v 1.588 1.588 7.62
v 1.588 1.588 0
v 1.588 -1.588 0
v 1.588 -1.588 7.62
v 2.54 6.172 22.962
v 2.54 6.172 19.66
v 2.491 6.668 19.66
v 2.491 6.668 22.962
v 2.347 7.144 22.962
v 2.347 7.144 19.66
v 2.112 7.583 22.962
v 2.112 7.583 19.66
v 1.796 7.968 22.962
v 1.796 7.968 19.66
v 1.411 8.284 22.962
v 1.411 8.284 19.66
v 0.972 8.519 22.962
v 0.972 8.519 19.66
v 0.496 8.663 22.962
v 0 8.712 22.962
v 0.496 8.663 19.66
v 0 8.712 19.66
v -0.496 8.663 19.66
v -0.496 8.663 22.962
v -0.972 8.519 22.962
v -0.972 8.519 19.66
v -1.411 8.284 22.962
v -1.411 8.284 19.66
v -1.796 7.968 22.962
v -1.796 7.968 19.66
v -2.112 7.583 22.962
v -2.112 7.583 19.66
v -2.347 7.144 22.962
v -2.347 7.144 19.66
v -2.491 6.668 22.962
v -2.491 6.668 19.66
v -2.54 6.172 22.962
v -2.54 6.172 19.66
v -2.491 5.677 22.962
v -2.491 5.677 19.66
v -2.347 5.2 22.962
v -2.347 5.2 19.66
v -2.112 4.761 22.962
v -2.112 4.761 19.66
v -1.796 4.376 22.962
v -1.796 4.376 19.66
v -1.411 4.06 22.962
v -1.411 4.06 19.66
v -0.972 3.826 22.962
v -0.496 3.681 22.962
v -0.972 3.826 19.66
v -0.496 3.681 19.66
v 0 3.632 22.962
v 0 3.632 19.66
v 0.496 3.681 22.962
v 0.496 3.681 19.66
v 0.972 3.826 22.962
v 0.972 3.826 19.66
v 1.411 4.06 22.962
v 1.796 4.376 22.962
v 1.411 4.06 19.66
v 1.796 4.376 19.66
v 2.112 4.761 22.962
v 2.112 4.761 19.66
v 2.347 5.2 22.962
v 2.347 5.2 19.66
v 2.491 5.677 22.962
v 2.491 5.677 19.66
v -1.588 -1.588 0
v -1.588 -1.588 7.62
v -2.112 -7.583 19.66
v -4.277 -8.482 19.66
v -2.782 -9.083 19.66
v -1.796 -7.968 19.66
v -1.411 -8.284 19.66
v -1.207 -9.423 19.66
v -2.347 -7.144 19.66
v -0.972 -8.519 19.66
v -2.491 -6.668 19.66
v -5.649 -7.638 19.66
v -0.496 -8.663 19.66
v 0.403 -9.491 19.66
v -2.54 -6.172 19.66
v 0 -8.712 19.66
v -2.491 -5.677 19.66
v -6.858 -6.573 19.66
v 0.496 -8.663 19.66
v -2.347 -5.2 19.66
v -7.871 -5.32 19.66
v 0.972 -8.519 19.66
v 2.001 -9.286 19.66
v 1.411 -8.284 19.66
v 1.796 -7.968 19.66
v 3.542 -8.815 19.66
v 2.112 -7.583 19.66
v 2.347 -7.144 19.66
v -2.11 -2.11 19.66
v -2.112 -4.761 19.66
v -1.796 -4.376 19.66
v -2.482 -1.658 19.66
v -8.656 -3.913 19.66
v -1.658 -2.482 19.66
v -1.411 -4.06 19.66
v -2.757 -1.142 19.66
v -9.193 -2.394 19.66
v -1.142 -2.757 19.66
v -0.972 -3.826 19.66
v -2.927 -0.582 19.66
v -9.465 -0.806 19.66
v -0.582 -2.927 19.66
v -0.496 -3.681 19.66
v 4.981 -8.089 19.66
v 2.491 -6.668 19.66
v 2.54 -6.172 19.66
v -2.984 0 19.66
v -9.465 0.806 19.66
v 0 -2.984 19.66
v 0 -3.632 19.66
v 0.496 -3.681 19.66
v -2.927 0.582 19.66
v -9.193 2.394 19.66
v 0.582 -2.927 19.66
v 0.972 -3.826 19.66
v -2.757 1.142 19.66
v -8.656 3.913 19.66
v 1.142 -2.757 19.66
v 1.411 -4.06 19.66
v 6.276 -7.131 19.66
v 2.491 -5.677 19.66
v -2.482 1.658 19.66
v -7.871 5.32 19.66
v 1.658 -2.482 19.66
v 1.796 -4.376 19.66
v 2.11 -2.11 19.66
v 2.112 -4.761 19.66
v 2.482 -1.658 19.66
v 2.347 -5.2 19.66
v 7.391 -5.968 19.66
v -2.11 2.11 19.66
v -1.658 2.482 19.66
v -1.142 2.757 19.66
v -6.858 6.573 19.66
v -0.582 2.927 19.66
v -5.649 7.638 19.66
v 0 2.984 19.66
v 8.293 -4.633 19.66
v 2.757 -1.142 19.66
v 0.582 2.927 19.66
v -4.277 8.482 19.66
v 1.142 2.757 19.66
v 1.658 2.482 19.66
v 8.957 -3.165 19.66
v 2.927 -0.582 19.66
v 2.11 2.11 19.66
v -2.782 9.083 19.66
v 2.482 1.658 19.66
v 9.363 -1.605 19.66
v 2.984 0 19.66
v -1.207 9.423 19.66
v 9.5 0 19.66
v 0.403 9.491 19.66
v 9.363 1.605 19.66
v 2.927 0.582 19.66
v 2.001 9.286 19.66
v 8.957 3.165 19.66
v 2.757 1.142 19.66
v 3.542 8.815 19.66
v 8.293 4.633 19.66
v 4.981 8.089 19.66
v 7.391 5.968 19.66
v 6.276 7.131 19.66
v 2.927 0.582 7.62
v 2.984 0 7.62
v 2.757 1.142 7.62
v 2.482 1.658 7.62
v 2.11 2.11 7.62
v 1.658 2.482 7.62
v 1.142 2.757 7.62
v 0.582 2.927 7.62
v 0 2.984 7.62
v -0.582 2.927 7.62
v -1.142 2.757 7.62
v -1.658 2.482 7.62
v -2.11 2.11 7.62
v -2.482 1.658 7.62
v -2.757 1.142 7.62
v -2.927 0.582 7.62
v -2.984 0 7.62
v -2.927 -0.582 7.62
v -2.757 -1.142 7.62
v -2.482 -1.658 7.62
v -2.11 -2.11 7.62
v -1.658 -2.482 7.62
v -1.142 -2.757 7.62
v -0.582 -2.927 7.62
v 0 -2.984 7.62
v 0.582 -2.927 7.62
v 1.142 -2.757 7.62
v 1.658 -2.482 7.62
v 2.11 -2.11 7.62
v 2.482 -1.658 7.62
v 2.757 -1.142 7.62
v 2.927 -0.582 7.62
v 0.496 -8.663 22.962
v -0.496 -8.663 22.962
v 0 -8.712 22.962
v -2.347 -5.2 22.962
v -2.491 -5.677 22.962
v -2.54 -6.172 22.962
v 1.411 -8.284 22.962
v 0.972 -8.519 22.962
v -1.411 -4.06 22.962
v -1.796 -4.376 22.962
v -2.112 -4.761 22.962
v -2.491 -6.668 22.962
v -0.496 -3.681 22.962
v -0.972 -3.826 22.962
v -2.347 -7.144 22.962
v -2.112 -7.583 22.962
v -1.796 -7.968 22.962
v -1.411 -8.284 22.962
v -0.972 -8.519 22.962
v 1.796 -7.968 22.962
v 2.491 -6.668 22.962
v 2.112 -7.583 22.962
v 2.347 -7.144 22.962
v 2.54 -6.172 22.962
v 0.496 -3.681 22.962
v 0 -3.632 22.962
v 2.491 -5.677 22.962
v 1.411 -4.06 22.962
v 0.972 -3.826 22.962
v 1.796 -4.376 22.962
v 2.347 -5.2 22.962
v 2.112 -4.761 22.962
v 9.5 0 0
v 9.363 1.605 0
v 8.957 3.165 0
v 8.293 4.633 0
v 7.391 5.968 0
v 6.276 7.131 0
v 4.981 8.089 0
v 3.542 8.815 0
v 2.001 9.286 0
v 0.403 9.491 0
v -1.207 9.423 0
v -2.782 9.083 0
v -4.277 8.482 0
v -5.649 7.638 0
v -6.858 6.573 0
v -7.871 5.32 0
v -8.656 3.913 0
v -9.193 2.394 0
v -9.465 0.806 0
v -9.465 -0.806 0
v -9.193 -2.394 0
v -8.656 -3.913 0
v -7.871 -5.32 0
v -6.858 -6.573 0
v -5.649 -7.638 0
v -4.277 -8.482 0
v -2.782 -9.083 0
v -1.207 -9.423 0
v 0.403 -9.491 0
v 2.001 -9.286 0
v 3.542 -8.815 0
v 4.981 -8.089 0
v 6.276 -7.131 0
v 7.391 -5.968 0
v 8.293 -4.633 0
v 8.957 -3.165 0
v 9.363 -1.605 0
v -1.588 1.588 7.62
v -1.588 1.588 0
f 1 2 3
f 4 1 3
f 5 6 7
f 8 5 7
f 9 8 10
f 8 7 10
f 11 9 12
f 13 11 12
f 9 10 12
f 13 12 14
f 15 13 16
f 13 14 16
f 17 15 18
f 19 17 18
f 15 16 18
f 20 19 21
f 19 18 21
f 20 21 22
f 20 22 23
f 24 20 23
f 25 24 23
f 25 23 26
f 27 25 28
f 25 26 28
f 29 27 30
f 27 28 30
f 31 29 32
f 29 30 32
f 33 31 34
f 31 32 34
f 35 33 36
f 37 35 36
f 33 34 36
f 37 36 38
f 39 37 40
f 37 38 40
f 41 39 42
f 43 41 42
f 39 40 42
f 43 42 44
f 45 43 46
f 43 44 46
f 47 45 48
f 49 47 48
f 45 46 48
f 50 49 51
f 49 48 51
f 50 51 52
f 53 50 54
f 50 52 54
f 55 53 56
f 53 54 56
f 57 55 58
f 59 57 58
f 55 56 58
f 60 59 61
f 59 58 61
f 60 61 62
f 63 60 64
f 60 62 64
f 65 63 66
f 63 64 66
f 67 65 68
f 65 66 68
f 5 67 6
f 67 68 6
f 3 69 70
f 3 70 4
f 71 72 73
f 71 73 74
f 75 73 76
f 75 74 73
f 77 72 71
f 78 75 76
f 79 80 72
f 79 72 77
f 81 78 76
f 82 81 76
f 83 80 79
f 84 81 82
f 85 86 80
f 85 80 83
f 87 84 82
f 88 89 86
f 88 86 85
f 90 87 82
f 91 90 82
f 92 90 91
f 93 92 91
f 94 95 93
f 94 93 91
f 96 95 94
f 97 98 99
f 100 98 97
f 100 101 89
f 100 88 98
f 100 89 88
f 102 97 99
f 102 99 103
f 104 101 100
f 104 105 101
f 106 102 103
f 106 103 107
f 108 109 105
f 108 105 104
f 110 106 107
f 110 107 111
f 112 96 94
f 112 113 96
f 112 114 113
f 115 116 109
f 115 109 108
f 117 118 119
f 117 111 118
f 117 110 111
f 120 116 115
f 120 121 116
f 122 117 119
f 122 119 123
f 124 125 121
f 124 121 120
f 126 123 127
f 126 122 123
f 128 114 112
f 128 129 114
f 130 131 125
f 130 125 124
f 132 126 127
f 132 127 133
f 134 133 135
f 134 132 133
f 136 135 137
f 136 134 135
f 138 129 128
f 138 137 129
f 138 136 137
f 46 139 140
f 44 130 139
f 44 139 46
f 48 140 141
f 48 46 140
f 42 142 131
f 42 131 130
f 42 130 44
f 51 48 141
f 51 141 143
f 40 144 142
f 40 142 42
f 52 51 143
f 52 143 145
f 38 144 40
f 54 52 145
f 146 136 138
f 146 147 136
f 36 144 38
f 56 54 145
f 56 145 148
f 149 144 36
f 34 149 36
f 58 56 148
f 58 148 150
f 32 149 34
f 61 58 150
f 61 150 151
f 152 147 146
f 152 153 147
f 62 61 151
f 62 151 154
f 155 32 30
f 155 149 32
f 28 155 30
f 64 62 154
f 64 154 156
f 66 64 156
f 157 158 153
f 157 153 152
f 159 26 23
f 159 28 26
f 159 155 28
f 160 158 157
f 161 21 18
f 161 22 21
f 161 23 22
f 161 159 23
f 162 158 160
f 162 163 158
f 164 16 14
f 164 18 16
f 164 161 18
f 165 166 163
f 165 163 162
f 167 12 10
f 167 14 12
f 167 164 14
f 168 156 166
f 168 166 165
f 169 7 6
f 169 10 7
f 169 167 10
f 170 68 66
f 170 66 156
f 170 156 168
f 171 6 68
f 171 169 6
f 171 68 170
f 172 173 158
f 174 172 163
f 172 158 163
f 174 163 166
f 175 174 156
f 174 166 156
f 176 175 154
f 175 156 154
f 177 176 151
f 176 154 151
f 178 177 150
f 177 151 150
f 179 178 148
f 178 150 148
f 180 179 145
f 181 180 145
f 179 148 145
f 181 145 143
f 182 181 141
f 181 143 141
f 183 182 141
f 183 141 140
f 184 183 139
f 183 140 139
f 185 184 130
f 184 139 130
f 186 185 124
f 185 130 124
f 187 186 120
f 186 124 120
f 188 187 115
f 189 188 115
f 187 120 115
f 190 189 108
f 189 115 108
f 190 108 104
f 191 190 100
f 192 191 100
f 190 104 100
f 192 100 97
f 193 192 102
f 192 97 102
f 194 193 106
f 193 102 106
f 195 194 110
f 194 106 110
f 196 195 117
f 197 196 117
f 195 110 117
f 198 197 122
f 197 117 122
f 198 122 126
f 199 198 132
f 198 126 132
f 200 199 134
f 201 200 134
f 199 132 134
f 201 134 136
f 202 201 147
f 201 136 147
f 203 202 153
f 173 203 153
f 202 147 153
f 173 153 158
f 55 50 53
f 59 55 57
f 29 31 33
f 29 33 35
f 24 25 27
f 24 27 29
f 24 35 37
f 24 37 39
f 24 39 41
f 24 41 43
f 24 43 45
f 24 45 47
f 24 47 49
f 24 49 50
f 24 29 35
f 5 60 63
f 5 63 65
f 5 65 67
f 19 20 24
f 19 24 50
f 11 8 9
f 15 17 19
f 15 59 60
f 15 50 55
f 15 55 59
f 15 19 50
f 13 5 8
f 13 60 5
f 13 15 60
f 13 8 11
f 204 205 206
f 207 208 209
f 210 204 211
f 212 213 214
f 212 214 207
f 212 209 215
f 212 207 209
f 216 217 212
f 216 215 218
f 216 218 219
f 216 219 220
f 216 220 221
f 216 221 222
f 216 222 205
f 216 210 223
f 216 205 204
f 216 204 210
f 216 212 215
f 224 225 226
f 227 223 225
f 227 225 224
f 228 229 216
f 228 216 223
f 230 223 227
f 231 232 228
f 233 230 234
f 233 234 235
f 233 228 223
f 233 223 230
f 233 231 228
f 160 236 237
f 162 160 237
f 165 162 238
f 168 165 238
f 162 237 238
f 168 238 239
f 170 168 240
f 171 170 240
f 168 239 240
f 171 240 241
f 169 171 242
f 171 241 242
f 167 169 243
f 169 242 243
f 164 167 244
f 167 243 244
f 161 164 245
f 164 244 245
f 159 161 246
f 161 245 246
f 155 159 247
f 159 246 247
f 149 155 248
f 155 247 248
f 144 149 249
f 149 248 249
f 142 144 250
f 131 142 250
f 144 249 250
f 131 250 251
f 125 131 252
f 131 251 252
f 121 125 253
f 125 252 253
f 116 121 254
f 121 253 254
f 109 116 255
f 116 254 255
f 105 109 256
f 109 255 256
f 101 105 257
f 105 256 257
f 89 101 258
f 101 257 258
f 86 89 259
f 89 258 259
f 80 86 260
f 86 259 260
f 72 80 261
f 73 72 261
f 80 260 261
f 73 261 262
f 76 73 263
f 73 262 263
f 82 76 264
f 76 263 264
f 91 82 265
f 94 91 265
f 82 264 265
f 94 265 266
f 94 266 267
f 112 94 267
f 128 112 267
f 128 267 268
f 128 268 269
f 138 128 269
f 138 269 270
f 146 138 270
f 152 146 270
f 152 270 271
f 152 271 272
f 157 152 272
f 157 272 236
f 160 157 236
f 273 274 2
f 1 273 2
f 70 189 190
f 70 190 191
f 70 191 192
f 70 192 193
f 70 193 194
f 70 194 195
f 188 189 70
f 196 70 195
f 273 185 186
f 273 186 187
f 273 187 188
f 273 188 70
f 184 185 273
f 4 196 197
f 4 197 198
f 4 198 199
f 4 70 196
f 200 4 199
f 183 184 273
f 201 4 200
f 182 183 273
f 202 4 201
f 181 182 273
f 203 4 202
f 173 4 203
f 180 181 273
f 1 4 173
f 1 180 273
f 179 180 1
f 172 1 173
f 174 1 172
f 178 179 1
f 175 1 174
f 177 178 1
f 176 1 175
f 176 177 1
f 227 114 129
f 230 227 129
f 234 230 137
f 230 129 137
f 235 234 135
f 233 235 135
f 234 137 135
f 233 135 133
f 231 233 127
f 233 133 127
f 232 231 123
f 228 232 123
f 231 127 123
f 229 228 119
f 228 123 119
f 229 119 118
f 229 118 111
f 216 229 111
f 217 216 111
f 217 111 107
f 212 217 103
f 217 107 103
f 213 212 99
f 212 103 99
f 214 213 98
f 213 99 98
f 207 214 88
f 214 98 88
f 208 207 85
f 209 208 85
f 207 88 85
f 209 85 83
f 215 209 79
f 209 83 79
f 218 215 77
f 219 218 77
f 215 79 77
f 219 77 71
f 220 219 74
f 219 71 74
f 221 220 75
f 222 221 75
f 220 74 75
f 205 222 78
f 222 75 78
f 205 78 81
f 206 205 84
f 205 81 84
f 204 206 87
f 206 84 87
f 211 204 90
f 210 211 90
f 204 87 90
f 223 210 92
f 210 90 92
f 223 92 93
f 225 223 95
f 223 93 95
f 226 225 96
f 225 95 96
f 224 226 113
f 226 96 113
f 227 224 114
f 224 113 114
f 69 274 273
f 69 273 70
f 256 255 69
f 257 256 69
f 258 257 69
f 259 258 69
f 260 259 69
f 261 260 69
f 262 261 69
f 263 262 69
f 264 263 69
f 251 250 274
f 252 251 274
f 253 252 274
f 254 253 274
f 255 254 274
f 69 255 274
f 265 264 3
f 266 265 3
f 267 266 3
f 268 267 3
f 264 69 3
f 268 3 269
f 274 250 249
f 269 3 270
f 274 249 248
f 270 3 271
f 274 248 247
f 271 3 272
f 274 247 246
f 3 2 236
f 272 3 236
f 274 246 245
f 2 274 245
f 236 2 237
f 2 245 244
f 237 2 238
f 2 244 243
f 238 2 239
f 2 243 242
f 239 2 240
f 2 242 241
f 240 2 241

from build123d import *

# Parameters (mm, degrees)
F0_R     = 9.4996
F1_DEPTH = 19.6596
F2_R     = 2.9845
F3_DEPTH = 12.0396
F4_R     = 2.54
F5_DEPTH = 3.302
F6_W     = 3.175
F6_H     = 3.175
F7_DEPTH = 25.4


with BuildPart() as f1:
    # F0 (on Top) → F1 (new body)
    with BuildSketch(Plane.XY):
        Circle(F0_R)
    extrude(amount=F1_DEPTH)

    # F2 (on face) → F3 (cut)
    with BuildSketch(Plane.XY.offset(19.6596)):
        Circle(F2_R)
    extrude(amount=-F3_DEPTH, mode=Mode.SUBTRACT)

    # F4 (on face) → F5 (join)
    with BuildSketch(Plane.XY.offset(19.6596)):
        with Locations((0, -6.1722)):
            Circle(F4_R)
        with Locations((0, 6.1722)):
            Circle(F4_R)
    extrude(amount=F5_DEPTH)

    # F6 (on face) → F7 (cut)
    with BuildSketch(Plane(origin=(0, 0, 0), x_dir=(1, 0, 0), z_dir=(0, 0, -1))):
        Rectangle(F6_W, F6_H)
    extrude(amount=-F7_DEPTH, mode=Mode.SUBTRACT)


solid = f1.part
